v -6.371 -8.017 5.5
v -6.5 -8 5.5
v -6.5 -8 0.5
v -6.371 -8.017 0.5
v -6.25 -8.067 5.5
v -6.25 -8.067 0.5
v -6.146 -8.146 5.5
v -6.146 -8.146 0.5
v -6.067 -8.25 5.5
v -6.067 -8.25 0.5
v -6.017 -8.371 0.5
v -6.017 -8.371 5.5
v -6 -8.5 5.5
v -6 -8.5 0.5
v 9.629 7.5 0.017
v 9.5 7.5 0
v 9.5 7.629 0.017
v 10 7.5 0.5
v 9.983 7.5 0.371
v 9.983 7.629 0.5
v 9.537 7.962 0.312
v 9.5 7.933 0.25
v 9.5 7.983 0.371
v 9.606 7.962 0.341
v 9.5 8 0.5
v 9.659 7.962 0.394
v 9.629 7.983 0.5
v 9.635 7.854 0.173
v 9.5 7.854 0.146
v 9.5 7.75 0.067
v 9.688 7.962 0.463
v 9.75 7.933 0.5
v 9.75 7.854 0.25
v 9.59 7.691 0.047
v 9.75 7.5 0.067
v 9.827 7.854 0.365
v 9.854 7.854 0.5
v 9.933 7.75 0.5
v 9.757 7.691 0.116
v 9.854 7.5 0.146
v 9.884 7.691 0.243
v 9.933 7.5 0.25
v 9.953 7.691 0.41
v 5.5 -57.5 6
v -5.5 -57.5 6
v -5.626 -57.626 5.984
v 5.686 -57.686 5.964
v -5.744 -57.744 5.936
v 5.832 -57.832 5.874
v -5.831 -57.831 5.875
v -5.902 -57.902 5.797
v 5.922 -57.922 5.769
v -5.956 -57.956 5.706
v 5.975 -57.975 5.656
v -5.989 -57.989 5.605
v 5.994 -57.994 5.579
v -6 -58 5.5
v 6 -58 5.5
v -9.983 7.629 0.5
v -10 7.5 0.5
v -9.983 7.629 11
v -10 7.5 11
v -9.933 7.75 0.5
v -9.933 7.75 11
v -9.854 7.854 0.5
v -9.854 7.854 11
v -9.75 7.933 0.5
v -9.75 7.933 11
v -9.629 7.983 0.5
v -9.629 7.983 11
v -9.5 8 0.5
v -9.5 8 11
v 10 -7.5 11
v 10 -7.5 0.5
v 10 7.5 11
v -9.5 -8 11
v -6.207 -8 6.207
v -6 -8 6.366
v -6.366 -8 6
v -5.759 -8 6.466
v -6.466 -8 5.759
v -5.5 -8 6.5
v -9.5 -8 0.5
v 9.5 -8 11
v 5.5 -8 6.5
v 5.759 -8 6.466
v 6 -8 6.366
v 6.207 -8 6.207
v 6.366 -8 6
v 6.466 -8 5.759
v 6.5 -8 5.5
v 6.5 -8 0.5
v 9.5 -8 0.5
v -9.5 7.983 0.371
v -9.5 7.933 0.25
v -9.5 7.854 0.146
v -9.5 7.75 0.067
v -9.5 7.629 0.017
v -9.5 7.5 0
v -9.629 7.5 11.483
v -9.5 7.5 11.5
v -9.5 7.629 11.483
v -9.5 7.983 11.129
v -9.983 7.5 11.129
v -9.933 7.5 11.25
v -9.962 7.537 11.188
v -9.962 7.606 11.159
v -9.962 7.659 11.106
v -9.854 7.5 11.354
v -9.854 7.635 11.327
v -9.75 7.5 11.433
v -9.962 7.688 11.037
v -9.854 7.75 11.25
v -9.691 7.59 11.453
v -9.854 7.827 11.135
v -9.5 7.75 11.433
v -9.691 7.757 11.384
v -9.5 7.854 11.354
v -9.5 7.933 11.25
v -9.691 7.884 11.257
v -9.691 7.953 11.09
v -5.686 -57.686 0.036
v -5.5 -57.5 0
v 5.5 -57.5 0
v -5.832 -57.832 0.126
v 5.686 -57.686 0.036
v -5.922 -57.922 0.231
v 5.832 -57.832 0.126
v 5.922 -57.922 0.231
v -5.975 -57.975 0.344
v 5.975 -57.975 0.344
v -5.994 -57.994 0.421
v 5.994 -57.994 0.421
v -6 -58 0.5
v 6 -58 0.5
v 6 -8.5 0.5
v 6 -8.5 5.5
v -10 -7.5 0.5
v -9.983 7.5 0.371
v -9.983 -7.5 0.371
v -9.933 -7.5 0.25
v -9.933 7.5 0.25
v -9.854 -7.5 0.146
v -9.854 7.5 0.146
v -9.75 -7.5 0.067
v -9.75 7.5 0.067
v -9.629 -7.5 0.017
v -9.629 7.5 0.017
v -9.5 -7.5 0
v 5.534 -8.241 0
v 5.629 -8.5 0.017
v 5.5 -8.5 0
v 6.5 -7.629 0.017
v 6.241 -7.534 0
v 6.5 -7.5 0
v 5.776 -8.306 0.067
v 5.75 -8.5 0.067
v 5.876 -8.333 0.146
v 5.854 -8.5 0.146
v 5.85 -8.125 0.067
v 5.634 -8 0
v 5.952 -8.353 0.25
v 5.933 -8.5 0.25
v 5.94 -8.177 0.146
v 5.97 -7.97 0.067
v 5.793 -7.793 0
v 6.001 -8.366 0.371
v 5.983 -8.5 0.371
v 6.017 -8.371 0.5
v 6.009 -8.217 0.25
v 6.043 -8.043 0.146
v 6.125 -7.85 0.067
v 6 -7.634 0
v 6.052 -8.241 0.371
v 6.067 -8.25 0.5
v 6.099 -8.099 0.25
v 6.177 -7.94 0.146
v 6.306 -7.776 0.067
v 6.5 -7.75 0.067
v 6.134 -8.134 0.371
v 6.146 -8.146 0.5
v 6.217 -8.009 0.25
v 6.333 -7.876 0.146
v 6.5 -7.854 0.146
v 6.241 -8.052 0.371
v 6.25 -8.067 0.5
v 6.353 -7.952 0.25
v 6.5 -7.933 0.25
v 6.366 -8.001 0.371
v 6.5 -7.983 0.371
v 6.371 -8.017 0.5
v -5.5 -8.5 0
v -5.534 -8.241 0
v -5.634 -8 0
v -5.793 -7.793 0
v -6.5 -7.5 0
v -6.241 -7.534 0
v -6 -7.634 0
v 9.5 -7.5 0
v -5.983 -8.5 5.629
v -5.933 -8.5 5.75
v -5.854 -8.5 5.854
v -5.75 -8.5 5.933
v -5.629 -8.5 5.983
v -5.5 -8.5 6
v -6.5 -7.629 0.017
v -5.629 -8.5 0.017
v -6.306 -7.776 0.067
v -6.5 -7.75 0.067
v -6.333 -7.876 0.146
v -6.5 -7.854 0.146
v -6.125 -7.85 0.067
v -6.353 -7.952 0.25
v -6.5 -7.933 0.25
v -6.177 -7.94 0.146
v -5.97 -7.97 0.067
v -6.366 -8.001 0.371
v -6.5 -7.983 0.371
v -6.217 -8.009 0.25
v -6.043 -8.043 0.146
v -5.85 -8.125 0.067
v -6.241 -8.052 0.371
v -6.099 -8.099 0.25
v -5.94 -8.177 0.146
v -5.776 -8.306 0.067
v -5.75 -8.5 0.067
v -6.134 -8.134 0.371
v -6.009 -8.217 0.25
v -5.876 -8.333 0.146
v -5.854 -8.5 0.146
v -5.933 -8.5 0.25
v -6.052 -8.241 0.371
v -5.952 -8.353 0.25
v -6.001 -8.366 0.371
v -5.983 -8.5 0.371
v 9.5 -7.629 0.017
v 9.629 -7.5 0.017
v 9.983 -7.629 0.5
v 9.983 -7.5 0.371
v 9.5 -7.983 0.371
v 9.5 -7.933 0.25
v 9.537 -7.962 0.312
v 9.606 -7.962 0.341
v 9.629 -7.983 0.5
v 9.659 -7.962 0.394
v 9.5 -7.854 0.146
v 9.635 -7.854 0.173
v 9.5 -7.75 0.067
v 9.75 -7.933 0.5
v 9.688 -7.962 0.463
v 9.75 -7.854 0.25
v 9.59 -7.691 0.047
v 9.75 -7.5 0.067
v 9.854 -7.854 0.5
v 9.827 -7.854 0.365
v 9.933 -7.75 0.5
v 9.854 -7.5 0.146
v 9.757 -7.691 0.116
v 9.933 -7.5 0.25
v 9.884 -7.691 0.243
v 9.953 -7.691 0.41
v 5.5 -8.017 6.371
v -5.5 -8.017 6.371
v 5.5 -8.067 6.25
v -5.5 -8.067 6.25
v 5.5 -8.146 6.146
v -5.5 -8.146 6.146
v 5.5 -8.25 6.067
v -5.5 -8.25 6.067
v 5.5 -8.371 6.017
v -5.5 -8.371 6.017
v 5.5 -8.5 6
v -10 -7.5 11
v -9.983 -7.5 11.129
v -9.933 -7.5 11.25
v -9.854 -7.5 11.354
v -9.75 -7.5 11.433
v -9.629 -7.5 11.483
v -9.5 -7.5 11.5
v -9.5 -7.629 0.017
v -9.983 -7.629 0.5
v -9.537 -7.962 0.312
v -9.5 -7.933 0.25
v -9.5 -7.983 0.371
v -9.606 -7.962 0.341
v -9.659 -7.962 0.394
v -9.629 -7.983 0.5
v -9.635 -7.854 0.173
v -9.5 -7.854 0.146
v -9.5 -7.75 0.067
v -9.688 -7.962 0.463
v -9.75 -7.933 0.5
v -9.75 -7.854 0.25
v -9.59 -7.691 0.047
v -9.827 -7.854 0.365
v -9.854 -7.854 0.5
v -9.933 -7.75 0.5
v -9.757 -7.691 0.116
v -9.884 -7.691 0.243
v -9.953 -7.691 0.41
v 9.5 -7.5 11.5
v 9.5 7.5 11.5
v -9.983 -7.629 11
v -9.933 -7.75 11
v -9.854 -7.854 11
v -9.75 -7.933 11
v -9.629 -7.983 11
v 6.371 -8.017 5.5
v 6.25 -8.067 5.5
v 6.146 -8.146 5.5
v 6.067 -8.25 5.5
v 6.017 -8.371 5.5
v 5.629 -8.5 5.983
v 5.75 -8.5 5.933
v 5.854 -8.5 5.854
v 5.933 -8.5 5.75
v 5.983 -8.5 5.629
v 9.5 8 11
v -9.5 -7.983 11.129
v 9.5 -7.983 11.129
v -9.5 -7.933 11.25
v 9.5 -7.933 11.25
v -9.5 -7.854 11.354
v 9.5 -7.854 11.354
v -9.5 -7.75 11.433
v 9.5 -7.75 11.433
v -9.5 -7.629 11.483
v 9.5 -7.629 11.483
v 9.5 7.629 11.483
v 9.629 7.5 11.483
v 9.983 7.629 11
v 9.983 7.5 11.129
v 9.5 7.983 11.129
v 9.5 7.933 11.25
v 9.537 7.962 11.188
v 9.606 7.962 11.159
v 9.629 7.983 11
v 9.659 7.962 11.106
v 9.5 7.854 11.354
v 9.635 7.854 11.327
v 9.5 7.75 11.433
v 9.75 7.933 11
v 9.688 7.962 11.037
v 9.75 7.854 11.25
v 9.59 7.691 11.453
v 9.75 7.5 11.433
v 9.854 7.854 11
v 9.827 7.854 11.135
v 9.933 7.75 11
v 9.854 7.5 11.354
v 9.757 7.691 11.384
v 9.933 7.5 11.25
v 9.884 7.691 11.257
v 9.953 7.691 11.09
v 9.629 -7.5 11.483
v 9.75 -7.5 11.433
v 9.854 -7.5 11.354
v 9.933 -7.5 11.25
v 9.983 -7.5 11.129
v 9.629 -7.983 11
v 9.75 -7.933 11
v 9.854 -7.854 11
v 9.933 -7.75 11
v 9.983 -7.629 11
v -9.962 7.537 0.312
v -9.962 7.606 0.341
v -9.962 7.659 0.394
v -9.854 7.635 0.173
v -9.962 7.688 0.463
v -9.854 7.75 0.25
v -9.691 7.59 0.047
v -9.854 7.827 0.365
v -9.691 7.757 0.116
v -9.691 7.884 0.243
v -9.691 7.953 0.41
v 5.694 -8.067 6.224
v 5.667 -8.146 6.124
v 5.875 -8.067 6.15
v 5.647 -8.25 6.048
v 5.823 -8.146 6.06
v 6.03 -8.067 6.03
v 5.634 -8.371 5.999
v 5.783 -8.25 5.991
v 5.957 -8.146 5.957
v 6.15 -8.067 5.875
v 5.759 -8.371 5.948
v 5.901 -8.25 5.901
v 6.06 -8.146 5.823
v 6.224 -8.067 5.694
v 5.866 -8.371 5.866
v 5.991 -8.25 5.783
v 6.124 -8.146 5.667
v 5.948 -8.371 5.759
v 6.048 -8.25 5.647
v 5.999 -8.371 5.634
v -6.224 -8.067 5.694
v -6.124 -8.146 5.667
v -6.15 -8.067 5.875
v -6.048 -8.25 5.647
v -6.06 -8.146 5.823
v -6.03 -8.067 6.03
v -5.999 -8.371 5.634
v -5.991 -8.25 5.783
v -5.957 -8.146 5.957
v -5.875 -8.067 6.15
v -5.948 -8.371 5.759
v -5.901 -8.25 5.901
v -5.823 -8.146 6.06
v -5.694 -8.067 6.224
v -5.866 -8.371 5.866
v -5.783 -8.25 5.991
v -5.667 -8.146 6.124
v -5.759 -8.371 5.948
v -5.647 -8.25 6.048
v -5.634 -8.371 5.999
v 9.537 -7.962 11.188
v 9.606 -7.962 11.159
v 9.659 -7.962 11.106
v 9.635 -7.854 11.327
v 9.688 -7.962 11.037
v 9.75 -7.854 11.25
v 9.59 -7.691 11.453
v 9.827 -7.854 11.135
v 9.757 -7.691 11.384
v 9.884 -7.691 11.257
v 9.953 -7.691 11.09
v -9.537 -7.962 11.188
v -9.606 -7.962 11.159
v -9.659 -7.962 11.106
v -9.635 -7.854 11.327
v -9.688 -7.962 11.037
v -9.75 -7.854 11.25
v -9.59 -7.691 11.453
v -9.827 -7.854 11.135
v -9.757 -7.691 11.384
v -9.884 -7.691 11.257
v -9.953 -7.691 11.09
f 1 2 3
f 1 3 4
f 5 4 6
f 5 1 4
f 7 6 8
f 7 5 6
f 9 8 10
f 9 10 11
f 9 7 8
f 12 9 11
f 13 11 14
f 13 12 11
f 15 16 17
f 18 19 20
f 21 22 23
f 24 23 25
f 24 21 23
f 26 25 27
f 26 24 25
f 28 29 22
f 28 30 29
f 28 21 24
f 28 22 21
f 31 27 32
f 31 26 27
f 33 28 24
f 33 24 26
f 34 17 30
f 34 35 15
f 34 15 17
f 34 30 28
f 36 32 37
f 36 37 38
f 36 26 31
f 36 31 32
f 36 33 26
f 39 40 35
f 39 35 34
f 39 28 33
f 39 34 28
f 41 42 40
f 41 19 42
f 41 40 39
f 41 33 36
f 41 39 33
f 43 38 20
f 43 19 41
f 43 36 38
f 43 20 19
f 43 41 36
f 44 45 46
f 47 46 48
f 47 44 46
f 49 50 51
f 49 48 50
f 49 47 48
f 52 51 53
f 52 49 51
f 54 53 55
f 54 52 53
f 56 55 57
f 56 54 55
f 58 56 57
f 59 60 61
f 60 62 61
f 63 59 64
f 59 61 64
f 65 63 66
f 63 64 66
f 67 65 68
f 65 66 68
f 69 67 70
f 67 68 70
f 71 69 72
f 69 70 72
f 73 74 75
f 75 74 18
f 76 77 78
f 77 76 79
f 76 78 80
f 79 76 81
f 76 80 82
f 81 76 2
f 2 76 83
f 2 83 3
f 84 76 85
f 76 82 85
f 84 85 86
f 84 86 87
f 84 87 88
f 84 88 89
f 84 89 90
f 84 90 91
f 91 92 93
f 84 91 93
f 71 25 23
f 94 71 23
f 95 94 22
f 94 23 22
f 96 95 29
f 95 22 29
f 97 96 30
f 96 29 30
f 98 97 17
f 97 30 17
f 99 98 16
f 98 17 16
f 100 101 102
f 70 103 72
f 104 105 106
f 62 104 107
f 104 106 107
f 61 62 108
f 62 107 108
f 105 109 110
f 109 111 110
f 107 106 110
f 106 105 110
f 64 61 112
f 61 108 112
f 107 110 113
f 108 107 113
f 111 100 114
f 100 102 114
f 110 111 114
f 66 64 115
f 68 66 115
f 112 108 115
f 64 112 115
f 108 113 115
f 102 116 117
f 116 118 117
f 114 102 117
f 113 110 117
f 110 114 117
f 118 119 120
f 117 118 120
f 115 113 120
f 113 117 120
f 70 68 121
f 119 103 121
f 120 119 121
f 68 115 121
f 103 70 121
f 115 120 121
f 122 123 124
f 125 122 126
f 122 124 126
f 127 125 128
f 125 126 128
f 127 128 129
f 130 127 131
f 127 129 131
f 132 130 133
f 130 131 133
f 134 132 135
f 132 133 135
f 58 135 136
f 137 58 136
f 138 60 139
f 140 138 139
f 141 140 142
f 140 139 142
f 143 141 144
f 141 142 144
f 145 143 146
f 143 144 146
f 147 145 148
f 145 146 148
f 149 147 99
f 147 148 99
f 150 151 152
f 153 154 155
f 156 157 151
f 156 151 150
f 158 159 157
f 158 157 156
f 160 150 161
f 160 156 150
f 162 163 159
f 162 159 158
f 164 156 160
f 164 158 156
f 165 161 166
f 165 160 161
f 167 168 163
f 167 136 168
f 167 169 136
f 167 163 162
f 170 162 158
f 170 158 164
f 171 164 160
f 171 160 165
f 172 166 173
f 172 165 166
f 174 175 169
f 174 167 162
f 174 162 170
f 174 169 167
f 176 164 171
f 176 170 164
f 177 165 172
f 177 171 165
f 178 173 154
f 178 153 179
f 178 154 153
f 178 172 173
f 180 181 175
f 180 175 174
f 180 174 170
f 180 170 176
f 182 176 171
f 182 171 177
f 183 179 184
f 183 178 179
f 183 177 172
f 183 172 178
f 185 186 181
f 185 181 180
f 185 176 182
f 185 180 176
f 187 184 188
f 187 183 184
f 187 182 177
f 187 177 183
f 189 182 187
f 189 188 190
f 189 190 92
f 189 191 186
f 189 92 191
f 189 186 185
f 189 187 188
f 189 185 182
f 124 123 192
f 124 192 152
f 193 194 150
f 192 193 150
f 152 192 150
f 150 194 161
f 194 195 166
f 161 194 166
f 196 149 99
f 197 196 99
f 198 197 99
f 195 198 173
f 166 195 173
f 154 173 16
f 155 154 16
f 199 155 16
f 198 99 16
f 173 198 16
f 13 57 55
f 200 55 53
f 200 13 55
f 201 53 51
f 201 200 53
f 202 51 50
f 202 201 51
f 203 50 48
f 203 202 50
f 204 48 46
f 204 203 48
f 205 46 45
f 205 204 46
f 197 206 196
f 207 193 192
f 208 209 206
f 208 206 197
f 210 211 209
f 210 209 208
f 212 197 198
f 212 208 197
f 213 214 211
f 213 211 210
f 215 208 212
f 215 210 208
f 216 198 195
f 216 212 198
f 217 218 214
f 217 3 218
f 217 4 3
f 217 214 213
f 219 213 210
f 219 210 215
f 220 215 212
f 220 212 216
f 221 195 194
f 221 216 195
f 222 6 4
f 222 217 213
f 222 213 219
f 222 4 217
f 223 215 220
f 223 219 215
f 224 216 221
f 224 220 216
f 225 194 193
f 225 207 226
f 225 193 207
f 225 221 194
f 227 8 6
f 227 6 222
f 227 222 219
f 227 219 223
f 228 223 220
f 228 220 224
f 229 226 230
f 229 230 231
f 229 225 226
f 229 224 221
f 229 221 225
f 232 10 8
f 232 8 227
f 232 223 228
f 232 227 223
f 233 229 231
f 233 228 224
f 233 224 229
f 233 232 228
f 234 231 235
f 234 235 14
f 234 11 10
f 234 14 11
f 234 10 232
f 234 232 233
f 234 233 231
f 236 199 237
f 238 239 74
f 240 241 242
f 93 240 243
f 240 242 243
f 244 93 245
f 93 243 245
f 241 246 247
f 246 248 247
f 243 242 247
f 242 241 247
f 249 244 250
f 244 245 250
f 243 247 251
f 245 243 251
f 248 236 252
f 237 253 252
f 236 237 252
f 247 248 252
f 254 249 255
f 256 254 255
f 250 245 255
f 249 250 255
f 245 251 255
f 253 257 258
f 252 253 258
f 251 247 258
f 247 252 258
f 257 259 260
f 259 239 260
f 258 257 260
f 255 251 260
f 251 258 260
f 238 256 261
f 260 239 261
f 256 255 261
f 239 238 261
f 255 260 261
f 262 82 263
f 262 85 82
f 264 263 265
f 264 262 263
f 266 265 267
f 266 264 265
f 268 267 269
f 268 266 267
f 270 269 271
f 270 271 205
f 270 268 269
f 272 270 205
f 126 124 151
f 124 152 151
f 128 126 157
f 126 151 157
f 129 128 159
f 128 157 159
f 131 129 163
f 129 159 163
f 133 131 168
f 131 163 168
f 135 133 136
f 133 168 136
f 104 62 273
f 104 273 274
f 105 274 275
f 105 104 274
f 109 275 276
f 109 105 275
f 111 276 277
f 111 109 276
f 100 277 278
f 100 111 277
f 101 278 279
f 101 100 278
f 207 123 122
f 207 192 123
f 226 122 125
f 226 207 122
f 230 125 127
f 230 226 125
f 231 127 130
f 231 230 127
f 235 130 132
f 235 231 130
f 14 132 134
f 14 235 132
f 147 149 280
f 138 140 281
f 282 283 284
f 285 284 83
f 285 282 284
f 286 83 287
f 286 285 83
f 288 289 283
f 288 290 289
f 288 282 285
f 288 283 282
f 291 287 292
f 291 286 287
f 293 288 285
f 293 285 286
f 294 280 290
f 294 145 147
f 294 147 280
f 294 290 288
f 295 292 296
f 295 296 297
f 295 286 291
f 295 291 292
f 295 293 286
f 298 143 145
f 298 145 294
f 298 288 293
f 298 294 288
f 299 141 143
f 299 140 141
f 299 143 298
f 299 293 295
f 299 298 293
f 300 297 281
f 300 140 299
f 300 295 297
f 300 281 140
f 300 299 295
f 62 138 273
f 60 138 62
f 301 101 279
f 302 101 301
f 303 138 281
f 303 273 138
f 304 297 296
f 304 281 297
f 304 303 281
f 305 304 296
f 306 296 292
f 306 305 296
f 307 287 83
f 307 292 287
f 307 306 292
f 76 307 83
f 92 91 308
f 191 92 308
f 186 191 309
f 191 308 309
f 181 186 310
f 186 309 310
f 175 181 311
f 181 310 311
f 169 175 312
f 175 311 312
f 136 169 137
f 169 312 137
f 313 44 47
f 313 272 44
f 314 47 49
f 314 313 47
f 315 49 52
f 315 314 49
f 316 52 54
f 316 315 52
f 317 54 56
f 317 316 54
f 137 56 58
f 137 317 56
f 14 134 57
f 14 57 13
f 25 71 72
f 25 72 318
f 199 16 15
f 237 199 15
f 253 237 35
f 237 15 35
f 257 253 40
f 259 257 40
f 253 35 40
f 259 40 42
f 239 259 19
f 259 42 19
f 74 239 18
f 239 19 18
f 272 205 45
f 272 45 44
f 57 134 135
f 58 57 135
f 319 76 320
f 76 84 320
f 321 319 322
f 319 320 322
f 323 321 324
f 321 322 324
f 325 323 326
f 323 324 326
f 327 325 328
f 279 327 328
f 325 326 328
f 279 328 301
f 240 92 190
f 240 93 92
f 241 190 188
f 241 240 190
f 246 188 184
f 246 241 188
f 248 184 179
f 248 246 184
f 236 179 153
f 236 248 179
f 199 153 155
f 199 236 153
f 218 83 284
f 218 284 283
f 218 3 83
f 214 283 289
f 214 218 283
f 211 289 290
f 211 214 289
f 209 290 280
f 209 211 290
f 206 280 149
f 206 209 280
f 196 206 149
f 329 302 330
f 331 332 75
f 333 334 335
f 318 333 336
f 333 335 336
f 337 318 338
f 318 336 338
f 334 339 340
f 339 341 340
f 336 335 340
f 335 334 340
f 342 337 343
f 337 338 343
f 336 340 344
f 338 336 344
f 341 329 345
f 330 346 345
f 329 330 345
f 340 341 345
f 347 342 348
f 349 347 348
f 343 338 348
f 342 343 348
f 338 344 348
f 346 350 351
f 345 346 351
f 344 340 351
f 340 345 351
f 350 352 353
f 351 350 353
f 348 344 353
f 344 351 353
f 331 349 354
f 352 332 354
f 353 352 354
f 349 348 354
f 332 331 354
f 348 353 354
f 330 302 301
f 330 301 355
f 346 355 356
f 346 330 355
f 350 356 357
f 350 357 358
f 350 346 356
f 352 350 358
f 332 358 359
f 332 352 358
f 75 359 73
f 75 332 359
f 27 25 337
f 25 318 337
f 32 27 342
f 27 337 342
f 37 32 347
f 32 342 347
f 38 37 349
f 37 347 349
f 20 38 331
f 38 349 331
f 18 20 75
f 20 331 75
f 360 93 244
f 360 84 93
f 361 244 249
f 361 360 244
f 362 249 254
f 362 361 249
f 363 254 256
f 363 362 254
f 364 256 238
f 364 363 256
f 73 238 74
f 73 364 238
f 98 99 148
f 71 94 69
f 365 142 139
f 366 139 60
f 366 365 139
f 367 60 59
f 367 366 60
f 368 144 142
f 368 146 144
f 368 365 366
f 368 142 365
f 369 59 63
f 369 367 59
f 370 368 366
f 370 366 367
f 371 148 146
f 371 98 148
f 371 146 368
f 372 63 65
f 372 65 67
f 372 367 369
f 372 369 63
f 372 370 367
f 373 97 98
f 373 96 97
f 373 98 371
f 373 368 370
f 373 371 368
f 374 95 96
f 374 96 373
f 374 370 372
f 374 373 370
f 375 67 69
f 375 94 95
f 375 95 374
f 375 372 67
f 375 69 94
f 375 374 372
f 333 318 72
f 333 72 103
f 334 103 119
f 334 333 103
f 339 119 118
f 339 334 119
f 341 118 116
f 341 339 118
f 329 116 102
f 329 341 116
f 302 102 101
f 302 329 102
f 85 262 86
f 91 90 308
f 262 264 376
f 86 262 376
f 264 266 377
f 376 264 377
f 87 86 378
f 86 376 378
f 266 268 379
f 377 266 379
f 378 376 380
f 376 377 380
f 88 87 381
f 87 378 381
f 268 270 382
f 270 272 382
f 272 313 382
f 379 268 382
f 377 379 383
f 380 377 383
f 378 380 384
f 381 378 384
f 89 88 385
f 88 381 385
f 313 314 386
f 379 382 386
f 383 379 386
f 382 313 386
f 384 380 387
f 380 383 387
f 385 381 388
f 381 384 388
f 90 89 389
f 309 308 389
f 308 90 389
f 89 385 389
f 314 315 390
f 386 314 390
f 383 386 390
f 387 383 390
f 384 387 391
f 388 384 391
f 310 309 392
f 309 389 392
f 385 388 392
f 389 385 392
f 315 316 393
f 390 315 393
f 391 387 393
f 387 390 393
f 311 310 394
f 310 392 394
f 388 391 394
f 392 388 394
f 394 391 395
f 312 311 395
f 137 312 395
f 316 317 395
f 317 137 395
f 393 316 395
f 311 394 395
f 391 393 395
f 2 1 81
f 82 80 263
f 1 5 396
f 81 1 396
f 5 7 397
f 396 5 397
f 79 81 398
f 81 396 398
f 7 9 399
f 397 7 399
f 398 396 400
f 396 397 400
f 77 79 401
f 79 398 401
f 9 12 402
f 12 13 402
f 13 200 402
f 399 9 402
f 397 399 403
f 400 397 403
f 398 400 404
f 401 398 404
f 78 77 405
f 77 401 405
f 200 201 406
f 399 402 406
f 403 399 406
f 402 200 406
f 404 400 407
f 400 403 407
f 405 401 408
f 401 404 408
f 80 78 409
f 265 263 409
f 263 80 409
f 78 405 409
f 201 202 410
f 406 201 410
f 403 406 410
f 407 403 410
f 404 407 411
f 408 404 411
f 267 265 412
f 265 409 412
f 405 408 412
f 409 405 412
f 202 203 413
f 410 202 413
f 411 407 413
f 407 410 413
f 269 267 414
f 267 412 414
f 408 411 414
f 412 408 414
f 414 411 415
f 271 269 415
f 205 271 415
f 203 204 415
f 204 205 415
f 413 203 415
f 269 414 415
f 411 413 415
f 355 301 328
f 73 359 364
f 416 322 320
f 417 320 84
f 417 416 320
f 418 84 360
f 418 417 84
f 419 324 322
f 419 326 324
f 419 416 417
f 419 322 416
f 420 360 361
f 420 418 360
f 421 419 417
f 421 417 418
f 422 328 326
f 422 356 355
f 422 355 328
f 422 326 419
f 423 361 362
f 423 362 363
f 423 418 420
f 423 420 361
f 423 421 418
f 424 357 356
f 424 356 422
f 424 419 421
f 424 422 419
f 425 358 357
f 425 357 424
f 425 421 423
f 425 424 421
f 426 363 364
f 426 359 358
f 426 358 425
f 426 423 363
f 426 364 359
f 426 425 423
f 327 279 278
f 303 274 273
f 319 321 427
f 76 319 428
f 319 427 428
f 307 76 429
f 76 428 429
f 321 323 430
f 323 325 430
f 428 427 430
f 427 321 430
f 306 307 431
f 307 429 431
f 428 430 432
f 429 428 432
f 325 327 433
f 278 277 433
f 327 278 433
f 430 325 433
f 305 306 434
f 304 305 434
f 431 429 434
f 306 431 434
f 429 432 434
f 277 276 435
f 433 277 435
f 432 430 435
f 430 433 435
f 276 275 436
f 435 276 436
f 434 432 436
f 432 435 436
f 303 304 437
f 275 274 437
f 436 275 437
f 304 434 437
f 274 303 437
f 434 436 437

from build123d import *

# Parameters (mm, degrees)
F0_W     = 20
F0_H     = 16
F1_DEPTH = 11.5
F2_W     = 12
F2_H     = 50
F3_DEPTH = 6
F4_R     = 0.5


with BuildPart() as f1:
    # F0 (on Top) → F1 (new body)
    with BuildSketch(Plane.XY):
        Rectangle(F0_W, F0_H)
    extrude(amount=F1_DEPTH)

    # F2 (on Top) → F3 (join)
    with BuildSketch(Plane.XY):
        with Locations((0, -33)):
            Rectangle(F2_W, F2_H)
    extrude(amount=F3_DEPTH)

    # F4
    f4_edges = [f1.edges().sort_by_distance(p)[0] for p in [
        (10, 0, 0),
        (0, 8, 0),
        (-10, 0, 0),
        (-8, -8, 0),
        (-6, -33, 0),
        (0, -58, 0),
        (6, -33, 0),
        (8, -8, 0),
        (10, 0, 11.5),
        (0, 8, 11.5),
        (-10, 0, 11.5),
        (0, -8, 11.5),
        (6, -33, 6),
        (0, -8, 6),
        (-6, -33, 6),
        (0, -58, 6),
        (10, 8, 5.75),
        (-10, 8, 5.75),
        (-6, -8, 3),
        (6, -8, 3),
        (10, -8, 5.75),
        (-10, -8, 5.75),
    ]]
    fillet(f4_edges, radius=F4_R)


solid = f1.part
